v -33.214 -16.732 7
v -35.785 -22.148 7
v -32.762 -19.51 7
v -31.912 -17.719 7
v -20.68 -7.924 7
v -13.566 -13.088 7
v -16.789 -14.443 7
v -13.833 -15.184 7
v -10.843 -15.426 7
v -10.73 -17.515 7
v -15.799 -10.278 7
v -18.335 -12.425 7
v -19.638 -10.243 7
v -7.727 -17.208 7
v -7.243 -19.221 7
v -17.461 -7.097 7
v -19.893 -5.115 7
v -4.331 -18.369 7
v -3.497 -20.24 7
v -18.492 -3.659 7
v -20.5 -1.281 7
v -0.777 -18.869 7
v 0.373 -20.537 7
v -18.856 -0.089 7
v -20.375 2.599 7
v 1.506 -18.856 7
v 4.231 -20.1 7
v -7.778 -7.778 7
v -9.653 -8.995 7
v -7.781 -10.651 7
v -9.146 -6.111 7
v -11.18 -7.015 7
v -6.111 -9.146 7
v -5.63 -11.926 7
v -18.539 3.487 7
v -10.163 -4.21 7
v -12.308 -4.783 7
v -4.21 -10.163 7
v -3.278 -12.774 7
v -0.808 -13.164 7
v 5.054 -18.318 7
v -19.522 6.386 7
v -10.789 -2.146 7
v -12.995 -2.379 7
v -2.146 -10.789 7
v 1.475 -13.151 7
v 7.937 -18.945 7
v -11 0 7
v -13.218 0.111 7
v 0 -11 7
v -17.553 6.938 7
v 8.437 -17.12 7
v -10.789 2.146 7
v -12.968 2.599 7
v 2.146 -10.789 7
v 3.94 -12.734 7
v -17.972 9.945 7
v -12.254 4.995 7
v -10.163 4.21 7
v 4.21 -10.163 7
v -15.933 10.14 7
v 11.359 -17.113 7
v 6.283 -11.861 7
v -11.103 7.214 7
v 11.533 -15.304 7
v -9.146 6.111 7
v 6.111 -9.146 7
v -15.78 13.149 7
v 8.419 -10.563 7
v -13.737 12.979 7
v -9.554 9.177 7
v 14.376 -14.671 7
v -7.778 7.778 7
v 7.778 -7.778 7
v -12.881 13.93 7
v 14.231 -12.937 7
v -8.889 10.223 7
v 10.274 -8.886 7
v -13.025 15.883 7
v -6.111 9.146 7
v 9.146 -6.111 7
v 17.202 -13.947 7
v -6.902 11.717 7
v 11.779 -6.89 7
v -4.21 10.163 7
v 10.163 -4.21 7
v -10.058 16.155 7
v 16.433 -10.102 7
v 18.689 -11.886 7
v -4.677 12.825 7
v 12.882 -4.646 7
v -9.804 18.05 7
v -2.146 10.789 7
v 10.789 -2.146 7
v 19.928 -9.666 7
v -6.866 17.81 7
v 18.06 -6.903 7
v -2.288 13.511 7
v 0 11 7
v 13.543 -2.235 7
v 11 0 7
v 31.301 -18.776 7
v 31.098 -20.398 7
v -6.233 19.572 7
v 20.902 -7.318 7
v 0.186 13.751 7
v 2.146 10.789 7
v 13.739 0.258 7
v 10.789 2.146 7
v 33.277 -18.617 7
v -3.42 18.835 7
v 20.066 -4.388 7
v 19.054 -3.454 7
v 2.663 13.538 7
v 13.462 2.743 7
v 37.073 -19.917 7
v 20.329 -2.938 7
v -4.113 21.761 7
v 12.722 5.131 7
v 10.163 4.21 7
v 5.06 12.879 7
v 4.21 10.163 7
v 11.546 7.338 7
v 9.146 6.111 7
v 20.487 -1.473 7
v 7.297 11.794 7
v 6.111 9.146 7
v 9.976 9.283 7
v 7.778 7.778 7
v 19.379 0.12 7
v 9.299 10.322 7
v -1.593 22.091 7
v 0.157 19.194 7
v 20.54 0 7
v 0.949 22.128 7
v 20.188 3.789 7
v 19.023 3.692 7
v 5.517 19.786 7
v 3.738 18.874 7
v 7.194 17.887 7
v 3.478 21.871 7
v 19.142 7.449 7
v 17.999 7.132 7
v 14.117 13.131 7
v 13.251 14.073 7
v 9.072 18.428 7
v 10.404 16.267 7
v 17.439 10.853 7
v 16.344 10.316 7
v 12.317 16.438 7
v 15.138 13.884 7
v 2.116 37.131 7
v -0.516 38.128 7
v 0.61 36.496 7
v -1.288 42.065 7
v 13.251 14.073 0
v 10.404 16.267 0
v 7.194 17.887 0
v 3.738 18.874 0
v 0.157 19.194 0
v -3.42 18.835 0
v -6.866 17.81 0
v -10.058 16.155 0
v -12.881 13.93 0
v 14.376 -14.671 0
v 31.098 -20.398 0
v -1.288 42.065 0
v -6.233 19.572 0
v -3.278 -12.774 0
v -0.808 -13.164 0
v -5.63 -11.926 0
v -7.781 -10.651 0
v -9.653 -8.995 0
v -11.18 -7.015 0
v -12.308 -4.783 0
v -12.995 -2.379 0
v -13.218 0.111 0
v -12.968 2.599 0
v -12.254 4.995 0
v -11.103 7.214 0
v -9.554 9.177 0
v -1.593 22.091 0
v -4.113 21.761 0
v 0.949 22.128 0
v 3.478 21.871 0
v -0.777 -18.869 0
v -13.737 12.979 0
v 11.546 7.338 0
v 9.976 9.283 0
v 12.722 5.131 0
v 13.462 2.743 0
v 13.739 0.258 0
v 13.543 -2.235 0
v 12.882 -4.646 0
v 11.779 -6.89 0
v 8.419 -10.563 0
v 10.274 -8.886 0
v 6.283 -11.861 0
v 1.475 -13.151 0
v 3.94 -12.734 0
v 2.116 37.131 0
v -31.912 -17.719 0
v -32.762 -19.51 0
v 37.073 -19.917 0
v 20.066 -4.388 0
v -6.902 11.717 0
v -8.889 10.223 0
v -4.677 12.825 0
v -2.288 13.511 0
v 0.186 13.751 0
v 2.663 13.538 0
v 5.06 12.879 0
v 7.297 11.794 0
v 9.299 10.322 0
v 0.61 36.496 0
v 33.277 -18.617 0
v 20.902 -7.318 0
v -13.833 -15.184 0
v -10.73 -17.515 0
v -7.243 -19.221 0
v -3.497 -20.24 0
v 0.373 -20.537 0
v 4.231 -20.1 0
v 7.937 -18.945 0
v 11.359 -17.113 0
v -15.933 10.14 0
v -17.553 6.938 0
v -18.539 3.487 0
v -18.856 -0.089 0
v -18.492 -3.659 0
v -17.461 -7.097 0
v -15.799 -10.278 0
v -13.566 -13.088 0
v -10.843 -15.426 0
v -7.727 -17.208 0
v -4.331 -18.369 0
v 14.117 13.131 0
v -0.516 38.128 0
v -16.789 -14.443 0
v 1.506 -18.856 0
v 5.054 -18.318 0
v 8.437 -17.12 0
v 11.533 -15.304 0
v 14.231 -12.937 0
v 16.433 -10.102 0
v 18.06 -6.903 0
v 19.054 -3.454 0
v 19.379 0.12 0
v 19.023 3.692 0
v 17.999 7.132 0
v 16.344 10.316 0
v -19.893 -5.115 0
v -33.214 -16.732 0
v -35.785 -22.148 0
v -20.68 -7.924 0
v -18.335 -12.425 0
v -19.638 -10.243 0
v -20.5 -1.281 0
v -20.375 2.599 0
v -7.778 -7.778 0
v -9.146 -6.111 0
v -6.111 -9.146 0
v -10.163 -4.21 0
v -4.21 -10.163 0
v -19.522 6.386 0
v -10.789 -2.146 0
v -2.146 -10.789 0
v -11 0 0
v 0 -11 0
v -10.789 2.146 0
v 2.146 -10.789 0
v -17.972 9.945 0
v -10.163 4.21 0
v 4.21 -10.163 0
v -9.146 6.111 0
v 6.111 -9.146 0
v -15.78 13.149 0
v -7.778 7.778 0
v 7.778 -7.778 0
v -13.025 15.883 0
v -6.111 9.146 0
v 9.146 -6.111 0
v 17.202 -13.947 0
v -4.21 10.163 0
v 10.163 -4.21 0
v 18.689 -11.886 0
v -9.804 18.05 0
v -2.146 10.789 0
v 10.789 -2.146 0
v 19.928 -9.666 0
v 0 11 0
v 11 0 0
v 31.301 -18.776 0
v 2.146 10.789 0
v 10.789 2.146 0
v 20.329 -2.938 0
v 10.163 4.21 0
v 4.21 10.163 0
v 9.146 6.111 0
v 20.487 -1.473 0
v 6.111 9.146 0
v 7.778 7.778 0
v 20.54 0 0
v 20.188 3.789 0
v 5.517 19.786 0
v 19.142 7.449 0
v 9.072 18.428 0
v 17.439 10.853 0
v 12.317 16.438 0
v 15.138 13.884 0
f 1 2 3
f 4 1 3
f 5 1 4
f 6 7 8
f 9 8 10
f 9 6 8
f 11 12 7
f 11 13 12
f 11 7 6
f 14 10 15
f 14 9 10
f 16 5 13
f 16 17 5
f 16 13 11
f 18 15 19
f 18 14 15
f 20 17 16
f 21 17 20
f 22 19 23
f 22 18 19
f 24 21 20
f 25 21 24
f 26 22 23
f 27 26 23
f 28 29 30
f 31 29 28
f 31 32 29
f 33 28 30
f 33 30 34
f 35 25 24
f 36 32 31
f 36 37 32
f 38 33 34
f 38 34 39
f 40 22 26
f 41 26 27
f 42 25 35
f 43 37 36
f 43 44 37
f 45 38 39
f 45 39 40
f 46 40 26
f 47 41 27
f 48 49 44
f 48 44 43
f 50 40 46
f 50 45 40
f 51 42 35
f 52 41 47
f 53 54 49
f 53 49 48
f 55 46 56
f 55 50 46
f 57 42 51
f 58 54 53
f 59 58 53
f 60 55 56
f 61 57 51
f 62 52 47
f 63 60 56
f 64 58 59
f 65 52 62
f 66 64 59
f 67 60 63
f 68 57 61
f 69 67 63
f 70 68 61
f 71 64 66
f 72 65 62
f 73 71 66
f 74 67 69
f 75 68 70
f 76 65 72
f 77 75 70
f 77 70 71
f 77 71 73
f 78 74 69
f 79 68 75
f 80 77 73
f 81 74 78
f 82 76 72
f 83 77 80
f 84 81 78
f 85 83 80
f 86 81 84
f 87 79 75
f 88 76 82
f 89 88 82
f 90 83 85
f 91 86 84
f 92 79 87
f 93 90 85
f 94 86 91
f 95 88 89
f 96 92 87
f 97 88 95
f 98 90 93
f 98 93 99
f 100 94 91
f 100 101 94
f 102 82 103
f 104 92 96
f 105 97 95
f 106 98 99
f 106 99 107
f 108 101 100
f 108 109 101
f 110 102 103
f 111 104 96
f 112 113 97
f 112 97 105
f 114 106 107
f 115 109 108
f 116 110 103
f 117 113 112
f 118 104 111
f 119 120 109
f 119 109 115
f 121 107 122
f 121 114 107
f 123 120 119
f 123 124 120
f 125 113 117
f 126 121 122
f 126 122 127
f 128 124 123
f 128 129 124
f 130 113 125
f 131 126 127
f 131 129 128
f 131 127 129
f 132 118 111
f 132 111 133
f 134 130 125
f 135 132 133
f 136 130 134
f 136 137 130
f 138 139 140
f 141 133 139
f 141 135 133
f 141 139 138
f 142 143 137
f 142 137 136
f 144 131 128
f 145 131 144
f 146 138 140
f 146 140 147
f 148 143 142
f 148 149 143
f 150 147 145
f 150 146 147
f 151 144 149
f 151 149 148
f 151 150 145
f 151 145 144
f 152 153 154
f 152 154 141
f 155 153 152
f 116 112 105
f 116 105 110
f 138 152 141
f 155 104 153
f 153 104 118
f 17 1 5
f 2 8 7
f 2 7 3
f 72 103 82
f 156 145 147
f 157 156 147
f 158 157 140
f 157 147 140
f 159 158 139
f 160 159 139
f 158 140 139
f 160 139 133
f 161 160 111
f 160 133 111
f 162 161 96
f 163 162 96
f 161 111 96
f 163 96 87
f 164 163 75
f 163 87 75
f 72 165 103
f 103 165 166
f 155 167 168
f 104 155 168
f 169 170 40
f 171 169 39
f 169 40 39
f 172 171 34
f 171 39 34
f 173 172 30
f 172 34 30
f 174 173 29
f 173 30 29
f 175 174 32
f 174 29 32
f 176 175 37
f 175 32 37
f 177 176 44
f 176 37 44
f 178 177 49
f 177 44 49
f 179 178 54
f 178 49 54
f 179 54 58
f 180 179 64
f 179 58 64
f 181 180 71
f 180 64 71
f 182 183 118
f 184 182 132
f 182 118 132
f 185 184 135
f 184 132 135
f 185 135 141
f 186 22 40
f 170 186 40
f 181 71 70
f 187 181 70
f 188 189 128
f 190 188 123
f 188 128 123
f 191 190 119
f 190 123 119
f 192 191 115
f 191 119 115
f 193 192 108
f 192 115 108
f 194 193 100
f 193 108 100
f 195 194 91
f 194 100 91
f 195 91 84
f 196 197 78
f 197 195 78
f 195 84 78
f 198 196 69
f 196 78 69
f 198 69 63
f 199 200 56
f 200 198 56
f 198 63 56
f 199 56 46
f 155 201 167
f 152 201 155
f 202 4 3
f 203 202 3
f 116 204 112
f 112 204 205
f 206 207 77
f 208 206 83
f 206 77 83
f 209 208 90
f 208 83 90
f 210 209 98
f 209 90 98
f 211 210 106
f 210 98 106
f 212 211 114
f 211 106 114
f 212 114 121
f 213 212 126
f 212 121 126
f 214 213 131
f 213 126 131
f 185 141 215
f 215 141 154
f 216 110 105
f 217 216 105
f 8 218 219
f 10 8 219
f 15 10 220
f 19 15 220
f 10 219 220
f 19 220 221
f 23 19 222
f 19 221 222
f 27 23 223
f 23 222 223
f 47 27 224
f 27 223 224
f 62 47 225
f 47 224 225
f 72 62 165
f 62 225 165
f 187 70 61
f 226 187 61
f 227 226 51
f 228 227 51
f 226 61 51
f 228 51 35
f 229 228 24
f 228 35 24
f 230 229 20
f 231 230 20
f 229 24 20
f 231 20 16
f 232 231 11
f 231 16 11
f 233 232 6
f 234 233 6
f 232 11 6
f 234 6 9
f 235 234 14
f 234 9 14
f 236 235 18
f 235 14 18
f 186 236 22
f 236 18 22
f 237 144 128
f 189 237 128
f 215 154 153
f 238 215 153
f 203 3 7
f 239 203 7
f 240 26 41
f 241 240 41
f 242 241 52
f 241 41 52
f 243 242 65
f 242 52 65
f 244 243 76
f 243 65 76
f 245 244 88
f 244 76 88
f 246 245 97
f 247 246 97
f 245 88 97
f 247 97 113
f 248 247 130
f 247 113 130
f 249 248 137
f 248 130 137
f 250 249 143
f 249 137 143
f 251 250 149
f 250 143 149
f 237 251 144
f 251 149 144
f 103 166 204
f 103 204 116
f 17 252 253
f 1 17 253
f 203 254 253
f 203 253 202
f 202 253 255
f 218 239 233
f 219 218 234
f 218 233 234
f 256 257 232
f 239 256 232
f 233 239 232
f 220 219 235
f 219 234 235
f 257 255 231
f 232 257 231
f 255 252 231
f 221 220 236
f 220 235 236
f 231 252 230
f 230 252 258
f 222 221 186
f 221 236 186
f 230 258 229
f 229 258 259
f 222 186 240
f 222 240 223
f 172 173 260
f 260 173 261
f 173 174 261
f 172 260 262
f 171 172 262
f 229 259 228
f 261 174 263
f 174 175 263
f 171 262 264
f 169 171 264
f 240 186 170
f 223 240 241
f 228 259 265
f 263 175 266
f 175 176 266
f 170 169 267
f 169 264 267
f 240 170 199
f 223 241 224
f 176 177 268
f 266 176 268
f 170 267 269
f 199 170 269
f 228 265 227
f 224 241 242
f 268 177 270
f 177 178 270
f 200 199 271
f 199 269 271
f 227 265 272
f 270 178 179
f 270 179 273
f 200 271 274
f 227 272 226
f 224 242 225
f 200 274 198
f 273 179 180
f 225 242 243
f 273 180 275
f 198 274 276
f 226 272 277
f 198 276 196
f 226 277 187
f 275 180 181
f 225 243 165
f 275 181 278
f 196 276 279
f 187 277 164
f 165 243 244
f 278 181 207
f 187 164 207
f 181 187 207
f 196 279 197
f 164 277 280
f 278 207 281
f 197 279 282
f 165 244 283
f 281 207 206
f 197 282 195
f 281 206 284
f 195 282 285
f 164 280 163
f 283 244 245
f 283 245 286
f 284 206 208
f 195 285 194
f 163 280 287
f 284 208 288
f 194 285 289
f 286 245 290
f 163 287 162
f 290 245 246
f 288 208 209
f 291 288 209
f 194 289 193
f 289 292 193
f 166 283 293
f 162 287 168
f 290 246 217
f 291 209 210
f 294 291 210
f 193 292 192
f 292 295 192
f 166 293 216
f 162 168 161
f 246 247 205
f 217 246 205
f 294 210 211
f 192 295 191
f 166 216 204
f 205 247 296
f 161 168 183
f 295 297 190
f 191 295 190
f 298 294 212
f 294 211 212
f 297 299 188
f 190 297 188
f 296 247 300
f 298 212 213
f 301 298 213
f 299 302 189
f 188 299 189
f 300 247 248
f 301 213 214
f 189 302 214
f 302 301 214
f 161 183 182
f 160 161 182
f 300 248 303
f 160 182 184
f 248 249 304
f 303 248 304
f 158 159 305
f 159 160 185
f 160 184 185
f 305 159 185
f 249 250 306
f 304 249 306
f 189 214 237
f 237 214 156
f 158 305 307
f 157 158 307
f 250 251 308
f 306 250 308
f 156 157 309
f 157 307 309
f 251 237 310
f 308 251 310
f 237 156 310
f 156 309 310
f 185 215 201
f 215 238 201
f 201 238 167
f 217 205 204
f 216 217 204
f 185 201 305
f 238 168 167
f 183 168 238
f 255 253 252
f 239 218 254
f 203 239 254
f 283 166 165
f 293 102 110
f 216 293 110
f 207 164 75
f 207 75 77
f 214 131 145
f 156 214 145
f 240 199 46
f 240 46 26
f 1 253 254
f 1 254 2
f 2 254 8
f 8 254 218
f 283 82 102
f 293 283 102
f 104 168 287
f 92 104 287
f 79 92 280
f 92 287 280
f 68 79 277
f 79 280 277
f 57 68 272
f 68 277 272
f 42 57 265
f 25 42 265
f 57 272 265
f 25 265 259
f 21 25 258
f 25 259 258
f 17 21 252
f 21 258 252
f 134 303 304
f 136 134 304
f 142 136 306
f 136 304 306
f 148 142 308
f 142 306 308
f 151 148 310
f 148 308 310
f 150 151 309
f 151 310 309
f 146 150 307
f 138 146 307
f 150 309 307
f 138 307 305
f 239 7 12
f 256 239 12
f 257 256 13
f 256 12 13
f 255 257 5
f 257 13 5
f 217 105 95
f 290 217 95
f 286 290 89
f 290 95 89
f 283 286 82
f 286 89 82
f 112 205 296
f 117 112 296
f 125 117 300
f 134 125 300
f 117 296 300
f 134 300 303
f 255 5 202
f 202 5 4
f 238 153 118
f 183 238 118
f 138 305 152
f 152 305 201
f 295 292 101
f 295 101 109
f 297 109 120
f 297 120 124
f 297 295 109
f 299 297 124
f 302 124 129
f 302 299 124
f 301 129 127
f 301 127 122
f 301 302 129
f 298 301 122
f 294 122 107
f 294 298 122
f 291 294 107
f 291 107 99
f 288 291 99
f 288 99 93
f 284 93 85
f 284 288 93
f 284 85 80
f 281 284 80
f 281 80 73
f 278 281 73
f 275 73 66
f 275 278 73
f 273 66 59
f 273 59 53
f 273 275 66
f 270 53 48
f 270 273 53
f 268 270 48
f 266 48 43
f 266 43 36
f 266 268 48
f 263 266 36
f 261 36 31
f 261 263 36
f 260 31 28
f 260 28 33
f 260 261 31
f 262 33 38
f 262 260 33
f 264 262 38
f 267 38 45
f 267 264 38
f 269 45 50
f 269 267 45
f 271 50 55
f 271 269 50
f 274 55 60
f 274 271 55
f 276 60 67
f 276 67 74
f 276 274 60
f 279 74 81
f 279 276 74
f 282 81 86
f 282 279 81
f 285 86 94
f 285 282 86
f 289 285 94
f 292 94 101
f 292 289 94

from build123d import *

# Parameters (mm, degrees)
F0_R       = 11
F1_DEPTH   = 7
F3_DEPTH   = 25
F4_SIZE2   = 11
F4_SIZE    = 6
F4_2_SIZE2 = 11
F4_2_SIZE  = 6
F4_3_SIZE2 = 11
F4_3_SIZE  = 6
F6_DEPTH   = 25


with BuildPart() as f1:
    # F0 (on Top) → F1 (new body)
    with BuildSketch(Plane.XY):
        with BuildLine():
            ThreePointArc((20.0661304609, -4.388266099), (20.4214599699, -2.2069081826), (20.5403619985, 0))
            ThreePointArc((20.5403619985, 0), (16.3588873239, 12.4214844746), (5.5169386953, 19.7855972481))
            ThreePointArc((5.5169386953, 19.7855972481), (-0.3734961981, 20.5369659789), (-6.2327153102, 19.5719117843))
            ThreePointArc((-6.2327153102, 19.5719117843), (-17.9722823534, 9.9450257937), (-19.8932991935, -5.1149895628))
            ThreePointArc((-19.8932991935, -5.1149895628), (-17.5987861554, -10.5919401852), (-13.8334151507, -15.1836456853))
            ThreePointArc((-13.8334151507, -15.1836456853), (0.3734961981, -20.5369659789), (14.3763604982, -14.6706076853))
            ThreePointArc((14.3763604982, -14.6706076853), (17.9722823534, -9.9450257937), (20.0661304609, -4.388266099))
        make_face()
        Circle(F0_R, mode=Mode.SUBTRACT)
        with BuildLine():
            ThreePointArc((-6.2327153102, 19.5719117843), (-0.3734961981, 20.5369659789), (5.5169386953, 19.7855972481))
            Line((5.5169386953, 19.7855972481), (0, 47.9250028729))
            Line((0, 47.9250028729), (-6.2327153102, 19.5719117843))
        make_face()
        with BuildLine():
            Line((41.5042699644, -23.9625014365), (20.0661304609, -4.388266099))
            ThreePointArc((20.0661304609, -4.388266099), (17.9722823534, -9.9450257937), (14.3763604982, -14.6706076853))
            Line((14.3763604982, -14.6706076853), (41.5042699644, -23.9625014365))
        make_face()
        with BuildLine():
            ThreePointArc((-13.8334151507, -15.1836456853), (-17.5987861554, -10.5919401852), (-19.8932991935, -5.1149895628))
            Line((-19.8932991935, -5.1149895628), (-41.5042699644, -23.9625014365))
            Line((-41.5042699644, -23.9625014365), (-13.8334151507, -15.1836456853))
        make_face()
    extrude(amount=F1_DEPTH)

    # F2 (on face) → F3 (cut)
    with BuildSketch(Plane.XY.offset(7)):
        with BuildLine():
            Line((-9.5540666953, 9.1768233106), (-13.7369418517, 12.9794366658))
            ThreePointArc((-13.7369418517, 12.9794366658), (-17.4606316299, -7.0968885961), (-0.7769295863, -18.868837785))
            Line((-0.7769295863, -18.868837785), (-0.8080550469, -13.1635311991))
            ThreePointArc((-0.8080550469, -13.1635311991), (-12.3077837352, -4.7833902956), (-9.5540666953, 9.1768233106))
        make_face()
        with BuildLine():
            ThreePointArc((1.5056530058, -18.8563850914), (18.0599213945, -6.9031052193), (14.1174058688, 13.1313968438))
            Line((14.1174058688, 13.1313968438), (9.9762689865, 9.2833716066))
            ThreePointArc((9.9762689865, 9.2833716066), (12.882138258, -4.6459659672), (1.4745275451, -13.1510785055))
            Line((1.4745275451, -13.1510785055), (1.5056530058, -18.8563850914))
        make_face()
        with BuildLine():
            ThreePointArc((13.2514961216, 14.0726582684), (0.156741732, 19.1941948225), (-12.8813534975, 13.9300897717))
            Line((-12.8813534975, 13.9300897717), (-8.888608776, 10.2225420997))
            ThreePointArc((-8.888608776, 10.2225420997), (0.1864346526, 13.7514732817), (9.2994411209, 10.3217675178))
            Line((9.2994411209, 10.3217675178), (13.2514961216, 14.0726582684))
        make_face()
    extrude(amount=-F3_DEPTH, mode=Mode.SUBTRACT)

    # F4
    f4_edges = [f1.edges().sort_by_distance(p)[0] for p in [
        (-41.50427, -23.962501, 3.5),
    ]]
    f4_side = f1.faces().sort_by_distance((-27.668843, -19.573074, 3.5))[0]
    chamfer(f4_edges, length=F4_SIZE, length2=F4_SIZE2, reference=f4_side)

    # F4#2
    f4_2_edges = [f1.edges().sort_by_distance(p)[0] for p in [
        (0, 47.925003, 3.5),
    ]]
    f4_2_side = f1.faces().sort_by_distance((-3.116358, 33.748457, 3.5))[0]
    chamfer(f4_2_edges, length=F4_2_SIZE, length2=F4_2_SIZE2, reference=f4_2_side)

    # F4#3
    f4_3_edges = [f1.edges().sort_by_distance(p)[0] for p in [
        (41.50427, -23.962501, 3.5),
    ]]
    f4_3_side = f1.faces().sort_by_distance((30.7852, -14.175384, 3.5))[0]
    chamfer(f4_3_edges, length=F4_3_SIZE, length2=F4_3_SIZE2, reference=f4_3_side)

    # F5 (on face) → F6 (cut)
    with BuildSketch(Plane.XY.offset(7)):
        with BuildLine():
            ThreePointArc((-4.1133450785, 21.7607795339), (-0.3226835167, 22.146741457), (3.4775948856, 21.8711226117))
            Line((3.4775948856, 21.8711226117), (0.6102930376, 36.4959307173))
            Line((0.6102930376, 36.4959307173), (-0.515505202, 38.1276239452))
            Line((-0.515505202, 38.1276239452), (-4.1133450785, 21.7607795339))
        make_face()
        with BuildLine():
            Line((-20.6797452338, -7.9238757909), (-31.9115496548, -17.7194360843))
            Line((-31.9115496548, -17.7194360843), (-32.7617383215, -19.5102525733))
            Line((-32.7617383215, -19.5102525733), (-16.7887153433, -14.4426510995))
            ThreePointArc((-16.7887153433, -14.4426510995), (-19.0182989544, -11.3528228513), (-20.6797452338, -7.9238757909))
        make_face()
        with BuildLine():
            Line((17.2021503482, -13.9472468209), (31.3012566171, -18.776494633))
            Line((31.3012566171, -18.776494633), (33.2772435235, -18.6173713719))
            Line((33.2772435235, -18.6173713719), (20.9020604218, -7.3181284344))
            ThreePointArc((20.9020604218, -7.3181284344), (19.3409824711, -10.7939186057), (17.2021503482, -13.9472468209))
        make_face()
    extrude(amount=-F6_DEPTH, mode=Mode.SUBTRACT)


solid = f1.part
